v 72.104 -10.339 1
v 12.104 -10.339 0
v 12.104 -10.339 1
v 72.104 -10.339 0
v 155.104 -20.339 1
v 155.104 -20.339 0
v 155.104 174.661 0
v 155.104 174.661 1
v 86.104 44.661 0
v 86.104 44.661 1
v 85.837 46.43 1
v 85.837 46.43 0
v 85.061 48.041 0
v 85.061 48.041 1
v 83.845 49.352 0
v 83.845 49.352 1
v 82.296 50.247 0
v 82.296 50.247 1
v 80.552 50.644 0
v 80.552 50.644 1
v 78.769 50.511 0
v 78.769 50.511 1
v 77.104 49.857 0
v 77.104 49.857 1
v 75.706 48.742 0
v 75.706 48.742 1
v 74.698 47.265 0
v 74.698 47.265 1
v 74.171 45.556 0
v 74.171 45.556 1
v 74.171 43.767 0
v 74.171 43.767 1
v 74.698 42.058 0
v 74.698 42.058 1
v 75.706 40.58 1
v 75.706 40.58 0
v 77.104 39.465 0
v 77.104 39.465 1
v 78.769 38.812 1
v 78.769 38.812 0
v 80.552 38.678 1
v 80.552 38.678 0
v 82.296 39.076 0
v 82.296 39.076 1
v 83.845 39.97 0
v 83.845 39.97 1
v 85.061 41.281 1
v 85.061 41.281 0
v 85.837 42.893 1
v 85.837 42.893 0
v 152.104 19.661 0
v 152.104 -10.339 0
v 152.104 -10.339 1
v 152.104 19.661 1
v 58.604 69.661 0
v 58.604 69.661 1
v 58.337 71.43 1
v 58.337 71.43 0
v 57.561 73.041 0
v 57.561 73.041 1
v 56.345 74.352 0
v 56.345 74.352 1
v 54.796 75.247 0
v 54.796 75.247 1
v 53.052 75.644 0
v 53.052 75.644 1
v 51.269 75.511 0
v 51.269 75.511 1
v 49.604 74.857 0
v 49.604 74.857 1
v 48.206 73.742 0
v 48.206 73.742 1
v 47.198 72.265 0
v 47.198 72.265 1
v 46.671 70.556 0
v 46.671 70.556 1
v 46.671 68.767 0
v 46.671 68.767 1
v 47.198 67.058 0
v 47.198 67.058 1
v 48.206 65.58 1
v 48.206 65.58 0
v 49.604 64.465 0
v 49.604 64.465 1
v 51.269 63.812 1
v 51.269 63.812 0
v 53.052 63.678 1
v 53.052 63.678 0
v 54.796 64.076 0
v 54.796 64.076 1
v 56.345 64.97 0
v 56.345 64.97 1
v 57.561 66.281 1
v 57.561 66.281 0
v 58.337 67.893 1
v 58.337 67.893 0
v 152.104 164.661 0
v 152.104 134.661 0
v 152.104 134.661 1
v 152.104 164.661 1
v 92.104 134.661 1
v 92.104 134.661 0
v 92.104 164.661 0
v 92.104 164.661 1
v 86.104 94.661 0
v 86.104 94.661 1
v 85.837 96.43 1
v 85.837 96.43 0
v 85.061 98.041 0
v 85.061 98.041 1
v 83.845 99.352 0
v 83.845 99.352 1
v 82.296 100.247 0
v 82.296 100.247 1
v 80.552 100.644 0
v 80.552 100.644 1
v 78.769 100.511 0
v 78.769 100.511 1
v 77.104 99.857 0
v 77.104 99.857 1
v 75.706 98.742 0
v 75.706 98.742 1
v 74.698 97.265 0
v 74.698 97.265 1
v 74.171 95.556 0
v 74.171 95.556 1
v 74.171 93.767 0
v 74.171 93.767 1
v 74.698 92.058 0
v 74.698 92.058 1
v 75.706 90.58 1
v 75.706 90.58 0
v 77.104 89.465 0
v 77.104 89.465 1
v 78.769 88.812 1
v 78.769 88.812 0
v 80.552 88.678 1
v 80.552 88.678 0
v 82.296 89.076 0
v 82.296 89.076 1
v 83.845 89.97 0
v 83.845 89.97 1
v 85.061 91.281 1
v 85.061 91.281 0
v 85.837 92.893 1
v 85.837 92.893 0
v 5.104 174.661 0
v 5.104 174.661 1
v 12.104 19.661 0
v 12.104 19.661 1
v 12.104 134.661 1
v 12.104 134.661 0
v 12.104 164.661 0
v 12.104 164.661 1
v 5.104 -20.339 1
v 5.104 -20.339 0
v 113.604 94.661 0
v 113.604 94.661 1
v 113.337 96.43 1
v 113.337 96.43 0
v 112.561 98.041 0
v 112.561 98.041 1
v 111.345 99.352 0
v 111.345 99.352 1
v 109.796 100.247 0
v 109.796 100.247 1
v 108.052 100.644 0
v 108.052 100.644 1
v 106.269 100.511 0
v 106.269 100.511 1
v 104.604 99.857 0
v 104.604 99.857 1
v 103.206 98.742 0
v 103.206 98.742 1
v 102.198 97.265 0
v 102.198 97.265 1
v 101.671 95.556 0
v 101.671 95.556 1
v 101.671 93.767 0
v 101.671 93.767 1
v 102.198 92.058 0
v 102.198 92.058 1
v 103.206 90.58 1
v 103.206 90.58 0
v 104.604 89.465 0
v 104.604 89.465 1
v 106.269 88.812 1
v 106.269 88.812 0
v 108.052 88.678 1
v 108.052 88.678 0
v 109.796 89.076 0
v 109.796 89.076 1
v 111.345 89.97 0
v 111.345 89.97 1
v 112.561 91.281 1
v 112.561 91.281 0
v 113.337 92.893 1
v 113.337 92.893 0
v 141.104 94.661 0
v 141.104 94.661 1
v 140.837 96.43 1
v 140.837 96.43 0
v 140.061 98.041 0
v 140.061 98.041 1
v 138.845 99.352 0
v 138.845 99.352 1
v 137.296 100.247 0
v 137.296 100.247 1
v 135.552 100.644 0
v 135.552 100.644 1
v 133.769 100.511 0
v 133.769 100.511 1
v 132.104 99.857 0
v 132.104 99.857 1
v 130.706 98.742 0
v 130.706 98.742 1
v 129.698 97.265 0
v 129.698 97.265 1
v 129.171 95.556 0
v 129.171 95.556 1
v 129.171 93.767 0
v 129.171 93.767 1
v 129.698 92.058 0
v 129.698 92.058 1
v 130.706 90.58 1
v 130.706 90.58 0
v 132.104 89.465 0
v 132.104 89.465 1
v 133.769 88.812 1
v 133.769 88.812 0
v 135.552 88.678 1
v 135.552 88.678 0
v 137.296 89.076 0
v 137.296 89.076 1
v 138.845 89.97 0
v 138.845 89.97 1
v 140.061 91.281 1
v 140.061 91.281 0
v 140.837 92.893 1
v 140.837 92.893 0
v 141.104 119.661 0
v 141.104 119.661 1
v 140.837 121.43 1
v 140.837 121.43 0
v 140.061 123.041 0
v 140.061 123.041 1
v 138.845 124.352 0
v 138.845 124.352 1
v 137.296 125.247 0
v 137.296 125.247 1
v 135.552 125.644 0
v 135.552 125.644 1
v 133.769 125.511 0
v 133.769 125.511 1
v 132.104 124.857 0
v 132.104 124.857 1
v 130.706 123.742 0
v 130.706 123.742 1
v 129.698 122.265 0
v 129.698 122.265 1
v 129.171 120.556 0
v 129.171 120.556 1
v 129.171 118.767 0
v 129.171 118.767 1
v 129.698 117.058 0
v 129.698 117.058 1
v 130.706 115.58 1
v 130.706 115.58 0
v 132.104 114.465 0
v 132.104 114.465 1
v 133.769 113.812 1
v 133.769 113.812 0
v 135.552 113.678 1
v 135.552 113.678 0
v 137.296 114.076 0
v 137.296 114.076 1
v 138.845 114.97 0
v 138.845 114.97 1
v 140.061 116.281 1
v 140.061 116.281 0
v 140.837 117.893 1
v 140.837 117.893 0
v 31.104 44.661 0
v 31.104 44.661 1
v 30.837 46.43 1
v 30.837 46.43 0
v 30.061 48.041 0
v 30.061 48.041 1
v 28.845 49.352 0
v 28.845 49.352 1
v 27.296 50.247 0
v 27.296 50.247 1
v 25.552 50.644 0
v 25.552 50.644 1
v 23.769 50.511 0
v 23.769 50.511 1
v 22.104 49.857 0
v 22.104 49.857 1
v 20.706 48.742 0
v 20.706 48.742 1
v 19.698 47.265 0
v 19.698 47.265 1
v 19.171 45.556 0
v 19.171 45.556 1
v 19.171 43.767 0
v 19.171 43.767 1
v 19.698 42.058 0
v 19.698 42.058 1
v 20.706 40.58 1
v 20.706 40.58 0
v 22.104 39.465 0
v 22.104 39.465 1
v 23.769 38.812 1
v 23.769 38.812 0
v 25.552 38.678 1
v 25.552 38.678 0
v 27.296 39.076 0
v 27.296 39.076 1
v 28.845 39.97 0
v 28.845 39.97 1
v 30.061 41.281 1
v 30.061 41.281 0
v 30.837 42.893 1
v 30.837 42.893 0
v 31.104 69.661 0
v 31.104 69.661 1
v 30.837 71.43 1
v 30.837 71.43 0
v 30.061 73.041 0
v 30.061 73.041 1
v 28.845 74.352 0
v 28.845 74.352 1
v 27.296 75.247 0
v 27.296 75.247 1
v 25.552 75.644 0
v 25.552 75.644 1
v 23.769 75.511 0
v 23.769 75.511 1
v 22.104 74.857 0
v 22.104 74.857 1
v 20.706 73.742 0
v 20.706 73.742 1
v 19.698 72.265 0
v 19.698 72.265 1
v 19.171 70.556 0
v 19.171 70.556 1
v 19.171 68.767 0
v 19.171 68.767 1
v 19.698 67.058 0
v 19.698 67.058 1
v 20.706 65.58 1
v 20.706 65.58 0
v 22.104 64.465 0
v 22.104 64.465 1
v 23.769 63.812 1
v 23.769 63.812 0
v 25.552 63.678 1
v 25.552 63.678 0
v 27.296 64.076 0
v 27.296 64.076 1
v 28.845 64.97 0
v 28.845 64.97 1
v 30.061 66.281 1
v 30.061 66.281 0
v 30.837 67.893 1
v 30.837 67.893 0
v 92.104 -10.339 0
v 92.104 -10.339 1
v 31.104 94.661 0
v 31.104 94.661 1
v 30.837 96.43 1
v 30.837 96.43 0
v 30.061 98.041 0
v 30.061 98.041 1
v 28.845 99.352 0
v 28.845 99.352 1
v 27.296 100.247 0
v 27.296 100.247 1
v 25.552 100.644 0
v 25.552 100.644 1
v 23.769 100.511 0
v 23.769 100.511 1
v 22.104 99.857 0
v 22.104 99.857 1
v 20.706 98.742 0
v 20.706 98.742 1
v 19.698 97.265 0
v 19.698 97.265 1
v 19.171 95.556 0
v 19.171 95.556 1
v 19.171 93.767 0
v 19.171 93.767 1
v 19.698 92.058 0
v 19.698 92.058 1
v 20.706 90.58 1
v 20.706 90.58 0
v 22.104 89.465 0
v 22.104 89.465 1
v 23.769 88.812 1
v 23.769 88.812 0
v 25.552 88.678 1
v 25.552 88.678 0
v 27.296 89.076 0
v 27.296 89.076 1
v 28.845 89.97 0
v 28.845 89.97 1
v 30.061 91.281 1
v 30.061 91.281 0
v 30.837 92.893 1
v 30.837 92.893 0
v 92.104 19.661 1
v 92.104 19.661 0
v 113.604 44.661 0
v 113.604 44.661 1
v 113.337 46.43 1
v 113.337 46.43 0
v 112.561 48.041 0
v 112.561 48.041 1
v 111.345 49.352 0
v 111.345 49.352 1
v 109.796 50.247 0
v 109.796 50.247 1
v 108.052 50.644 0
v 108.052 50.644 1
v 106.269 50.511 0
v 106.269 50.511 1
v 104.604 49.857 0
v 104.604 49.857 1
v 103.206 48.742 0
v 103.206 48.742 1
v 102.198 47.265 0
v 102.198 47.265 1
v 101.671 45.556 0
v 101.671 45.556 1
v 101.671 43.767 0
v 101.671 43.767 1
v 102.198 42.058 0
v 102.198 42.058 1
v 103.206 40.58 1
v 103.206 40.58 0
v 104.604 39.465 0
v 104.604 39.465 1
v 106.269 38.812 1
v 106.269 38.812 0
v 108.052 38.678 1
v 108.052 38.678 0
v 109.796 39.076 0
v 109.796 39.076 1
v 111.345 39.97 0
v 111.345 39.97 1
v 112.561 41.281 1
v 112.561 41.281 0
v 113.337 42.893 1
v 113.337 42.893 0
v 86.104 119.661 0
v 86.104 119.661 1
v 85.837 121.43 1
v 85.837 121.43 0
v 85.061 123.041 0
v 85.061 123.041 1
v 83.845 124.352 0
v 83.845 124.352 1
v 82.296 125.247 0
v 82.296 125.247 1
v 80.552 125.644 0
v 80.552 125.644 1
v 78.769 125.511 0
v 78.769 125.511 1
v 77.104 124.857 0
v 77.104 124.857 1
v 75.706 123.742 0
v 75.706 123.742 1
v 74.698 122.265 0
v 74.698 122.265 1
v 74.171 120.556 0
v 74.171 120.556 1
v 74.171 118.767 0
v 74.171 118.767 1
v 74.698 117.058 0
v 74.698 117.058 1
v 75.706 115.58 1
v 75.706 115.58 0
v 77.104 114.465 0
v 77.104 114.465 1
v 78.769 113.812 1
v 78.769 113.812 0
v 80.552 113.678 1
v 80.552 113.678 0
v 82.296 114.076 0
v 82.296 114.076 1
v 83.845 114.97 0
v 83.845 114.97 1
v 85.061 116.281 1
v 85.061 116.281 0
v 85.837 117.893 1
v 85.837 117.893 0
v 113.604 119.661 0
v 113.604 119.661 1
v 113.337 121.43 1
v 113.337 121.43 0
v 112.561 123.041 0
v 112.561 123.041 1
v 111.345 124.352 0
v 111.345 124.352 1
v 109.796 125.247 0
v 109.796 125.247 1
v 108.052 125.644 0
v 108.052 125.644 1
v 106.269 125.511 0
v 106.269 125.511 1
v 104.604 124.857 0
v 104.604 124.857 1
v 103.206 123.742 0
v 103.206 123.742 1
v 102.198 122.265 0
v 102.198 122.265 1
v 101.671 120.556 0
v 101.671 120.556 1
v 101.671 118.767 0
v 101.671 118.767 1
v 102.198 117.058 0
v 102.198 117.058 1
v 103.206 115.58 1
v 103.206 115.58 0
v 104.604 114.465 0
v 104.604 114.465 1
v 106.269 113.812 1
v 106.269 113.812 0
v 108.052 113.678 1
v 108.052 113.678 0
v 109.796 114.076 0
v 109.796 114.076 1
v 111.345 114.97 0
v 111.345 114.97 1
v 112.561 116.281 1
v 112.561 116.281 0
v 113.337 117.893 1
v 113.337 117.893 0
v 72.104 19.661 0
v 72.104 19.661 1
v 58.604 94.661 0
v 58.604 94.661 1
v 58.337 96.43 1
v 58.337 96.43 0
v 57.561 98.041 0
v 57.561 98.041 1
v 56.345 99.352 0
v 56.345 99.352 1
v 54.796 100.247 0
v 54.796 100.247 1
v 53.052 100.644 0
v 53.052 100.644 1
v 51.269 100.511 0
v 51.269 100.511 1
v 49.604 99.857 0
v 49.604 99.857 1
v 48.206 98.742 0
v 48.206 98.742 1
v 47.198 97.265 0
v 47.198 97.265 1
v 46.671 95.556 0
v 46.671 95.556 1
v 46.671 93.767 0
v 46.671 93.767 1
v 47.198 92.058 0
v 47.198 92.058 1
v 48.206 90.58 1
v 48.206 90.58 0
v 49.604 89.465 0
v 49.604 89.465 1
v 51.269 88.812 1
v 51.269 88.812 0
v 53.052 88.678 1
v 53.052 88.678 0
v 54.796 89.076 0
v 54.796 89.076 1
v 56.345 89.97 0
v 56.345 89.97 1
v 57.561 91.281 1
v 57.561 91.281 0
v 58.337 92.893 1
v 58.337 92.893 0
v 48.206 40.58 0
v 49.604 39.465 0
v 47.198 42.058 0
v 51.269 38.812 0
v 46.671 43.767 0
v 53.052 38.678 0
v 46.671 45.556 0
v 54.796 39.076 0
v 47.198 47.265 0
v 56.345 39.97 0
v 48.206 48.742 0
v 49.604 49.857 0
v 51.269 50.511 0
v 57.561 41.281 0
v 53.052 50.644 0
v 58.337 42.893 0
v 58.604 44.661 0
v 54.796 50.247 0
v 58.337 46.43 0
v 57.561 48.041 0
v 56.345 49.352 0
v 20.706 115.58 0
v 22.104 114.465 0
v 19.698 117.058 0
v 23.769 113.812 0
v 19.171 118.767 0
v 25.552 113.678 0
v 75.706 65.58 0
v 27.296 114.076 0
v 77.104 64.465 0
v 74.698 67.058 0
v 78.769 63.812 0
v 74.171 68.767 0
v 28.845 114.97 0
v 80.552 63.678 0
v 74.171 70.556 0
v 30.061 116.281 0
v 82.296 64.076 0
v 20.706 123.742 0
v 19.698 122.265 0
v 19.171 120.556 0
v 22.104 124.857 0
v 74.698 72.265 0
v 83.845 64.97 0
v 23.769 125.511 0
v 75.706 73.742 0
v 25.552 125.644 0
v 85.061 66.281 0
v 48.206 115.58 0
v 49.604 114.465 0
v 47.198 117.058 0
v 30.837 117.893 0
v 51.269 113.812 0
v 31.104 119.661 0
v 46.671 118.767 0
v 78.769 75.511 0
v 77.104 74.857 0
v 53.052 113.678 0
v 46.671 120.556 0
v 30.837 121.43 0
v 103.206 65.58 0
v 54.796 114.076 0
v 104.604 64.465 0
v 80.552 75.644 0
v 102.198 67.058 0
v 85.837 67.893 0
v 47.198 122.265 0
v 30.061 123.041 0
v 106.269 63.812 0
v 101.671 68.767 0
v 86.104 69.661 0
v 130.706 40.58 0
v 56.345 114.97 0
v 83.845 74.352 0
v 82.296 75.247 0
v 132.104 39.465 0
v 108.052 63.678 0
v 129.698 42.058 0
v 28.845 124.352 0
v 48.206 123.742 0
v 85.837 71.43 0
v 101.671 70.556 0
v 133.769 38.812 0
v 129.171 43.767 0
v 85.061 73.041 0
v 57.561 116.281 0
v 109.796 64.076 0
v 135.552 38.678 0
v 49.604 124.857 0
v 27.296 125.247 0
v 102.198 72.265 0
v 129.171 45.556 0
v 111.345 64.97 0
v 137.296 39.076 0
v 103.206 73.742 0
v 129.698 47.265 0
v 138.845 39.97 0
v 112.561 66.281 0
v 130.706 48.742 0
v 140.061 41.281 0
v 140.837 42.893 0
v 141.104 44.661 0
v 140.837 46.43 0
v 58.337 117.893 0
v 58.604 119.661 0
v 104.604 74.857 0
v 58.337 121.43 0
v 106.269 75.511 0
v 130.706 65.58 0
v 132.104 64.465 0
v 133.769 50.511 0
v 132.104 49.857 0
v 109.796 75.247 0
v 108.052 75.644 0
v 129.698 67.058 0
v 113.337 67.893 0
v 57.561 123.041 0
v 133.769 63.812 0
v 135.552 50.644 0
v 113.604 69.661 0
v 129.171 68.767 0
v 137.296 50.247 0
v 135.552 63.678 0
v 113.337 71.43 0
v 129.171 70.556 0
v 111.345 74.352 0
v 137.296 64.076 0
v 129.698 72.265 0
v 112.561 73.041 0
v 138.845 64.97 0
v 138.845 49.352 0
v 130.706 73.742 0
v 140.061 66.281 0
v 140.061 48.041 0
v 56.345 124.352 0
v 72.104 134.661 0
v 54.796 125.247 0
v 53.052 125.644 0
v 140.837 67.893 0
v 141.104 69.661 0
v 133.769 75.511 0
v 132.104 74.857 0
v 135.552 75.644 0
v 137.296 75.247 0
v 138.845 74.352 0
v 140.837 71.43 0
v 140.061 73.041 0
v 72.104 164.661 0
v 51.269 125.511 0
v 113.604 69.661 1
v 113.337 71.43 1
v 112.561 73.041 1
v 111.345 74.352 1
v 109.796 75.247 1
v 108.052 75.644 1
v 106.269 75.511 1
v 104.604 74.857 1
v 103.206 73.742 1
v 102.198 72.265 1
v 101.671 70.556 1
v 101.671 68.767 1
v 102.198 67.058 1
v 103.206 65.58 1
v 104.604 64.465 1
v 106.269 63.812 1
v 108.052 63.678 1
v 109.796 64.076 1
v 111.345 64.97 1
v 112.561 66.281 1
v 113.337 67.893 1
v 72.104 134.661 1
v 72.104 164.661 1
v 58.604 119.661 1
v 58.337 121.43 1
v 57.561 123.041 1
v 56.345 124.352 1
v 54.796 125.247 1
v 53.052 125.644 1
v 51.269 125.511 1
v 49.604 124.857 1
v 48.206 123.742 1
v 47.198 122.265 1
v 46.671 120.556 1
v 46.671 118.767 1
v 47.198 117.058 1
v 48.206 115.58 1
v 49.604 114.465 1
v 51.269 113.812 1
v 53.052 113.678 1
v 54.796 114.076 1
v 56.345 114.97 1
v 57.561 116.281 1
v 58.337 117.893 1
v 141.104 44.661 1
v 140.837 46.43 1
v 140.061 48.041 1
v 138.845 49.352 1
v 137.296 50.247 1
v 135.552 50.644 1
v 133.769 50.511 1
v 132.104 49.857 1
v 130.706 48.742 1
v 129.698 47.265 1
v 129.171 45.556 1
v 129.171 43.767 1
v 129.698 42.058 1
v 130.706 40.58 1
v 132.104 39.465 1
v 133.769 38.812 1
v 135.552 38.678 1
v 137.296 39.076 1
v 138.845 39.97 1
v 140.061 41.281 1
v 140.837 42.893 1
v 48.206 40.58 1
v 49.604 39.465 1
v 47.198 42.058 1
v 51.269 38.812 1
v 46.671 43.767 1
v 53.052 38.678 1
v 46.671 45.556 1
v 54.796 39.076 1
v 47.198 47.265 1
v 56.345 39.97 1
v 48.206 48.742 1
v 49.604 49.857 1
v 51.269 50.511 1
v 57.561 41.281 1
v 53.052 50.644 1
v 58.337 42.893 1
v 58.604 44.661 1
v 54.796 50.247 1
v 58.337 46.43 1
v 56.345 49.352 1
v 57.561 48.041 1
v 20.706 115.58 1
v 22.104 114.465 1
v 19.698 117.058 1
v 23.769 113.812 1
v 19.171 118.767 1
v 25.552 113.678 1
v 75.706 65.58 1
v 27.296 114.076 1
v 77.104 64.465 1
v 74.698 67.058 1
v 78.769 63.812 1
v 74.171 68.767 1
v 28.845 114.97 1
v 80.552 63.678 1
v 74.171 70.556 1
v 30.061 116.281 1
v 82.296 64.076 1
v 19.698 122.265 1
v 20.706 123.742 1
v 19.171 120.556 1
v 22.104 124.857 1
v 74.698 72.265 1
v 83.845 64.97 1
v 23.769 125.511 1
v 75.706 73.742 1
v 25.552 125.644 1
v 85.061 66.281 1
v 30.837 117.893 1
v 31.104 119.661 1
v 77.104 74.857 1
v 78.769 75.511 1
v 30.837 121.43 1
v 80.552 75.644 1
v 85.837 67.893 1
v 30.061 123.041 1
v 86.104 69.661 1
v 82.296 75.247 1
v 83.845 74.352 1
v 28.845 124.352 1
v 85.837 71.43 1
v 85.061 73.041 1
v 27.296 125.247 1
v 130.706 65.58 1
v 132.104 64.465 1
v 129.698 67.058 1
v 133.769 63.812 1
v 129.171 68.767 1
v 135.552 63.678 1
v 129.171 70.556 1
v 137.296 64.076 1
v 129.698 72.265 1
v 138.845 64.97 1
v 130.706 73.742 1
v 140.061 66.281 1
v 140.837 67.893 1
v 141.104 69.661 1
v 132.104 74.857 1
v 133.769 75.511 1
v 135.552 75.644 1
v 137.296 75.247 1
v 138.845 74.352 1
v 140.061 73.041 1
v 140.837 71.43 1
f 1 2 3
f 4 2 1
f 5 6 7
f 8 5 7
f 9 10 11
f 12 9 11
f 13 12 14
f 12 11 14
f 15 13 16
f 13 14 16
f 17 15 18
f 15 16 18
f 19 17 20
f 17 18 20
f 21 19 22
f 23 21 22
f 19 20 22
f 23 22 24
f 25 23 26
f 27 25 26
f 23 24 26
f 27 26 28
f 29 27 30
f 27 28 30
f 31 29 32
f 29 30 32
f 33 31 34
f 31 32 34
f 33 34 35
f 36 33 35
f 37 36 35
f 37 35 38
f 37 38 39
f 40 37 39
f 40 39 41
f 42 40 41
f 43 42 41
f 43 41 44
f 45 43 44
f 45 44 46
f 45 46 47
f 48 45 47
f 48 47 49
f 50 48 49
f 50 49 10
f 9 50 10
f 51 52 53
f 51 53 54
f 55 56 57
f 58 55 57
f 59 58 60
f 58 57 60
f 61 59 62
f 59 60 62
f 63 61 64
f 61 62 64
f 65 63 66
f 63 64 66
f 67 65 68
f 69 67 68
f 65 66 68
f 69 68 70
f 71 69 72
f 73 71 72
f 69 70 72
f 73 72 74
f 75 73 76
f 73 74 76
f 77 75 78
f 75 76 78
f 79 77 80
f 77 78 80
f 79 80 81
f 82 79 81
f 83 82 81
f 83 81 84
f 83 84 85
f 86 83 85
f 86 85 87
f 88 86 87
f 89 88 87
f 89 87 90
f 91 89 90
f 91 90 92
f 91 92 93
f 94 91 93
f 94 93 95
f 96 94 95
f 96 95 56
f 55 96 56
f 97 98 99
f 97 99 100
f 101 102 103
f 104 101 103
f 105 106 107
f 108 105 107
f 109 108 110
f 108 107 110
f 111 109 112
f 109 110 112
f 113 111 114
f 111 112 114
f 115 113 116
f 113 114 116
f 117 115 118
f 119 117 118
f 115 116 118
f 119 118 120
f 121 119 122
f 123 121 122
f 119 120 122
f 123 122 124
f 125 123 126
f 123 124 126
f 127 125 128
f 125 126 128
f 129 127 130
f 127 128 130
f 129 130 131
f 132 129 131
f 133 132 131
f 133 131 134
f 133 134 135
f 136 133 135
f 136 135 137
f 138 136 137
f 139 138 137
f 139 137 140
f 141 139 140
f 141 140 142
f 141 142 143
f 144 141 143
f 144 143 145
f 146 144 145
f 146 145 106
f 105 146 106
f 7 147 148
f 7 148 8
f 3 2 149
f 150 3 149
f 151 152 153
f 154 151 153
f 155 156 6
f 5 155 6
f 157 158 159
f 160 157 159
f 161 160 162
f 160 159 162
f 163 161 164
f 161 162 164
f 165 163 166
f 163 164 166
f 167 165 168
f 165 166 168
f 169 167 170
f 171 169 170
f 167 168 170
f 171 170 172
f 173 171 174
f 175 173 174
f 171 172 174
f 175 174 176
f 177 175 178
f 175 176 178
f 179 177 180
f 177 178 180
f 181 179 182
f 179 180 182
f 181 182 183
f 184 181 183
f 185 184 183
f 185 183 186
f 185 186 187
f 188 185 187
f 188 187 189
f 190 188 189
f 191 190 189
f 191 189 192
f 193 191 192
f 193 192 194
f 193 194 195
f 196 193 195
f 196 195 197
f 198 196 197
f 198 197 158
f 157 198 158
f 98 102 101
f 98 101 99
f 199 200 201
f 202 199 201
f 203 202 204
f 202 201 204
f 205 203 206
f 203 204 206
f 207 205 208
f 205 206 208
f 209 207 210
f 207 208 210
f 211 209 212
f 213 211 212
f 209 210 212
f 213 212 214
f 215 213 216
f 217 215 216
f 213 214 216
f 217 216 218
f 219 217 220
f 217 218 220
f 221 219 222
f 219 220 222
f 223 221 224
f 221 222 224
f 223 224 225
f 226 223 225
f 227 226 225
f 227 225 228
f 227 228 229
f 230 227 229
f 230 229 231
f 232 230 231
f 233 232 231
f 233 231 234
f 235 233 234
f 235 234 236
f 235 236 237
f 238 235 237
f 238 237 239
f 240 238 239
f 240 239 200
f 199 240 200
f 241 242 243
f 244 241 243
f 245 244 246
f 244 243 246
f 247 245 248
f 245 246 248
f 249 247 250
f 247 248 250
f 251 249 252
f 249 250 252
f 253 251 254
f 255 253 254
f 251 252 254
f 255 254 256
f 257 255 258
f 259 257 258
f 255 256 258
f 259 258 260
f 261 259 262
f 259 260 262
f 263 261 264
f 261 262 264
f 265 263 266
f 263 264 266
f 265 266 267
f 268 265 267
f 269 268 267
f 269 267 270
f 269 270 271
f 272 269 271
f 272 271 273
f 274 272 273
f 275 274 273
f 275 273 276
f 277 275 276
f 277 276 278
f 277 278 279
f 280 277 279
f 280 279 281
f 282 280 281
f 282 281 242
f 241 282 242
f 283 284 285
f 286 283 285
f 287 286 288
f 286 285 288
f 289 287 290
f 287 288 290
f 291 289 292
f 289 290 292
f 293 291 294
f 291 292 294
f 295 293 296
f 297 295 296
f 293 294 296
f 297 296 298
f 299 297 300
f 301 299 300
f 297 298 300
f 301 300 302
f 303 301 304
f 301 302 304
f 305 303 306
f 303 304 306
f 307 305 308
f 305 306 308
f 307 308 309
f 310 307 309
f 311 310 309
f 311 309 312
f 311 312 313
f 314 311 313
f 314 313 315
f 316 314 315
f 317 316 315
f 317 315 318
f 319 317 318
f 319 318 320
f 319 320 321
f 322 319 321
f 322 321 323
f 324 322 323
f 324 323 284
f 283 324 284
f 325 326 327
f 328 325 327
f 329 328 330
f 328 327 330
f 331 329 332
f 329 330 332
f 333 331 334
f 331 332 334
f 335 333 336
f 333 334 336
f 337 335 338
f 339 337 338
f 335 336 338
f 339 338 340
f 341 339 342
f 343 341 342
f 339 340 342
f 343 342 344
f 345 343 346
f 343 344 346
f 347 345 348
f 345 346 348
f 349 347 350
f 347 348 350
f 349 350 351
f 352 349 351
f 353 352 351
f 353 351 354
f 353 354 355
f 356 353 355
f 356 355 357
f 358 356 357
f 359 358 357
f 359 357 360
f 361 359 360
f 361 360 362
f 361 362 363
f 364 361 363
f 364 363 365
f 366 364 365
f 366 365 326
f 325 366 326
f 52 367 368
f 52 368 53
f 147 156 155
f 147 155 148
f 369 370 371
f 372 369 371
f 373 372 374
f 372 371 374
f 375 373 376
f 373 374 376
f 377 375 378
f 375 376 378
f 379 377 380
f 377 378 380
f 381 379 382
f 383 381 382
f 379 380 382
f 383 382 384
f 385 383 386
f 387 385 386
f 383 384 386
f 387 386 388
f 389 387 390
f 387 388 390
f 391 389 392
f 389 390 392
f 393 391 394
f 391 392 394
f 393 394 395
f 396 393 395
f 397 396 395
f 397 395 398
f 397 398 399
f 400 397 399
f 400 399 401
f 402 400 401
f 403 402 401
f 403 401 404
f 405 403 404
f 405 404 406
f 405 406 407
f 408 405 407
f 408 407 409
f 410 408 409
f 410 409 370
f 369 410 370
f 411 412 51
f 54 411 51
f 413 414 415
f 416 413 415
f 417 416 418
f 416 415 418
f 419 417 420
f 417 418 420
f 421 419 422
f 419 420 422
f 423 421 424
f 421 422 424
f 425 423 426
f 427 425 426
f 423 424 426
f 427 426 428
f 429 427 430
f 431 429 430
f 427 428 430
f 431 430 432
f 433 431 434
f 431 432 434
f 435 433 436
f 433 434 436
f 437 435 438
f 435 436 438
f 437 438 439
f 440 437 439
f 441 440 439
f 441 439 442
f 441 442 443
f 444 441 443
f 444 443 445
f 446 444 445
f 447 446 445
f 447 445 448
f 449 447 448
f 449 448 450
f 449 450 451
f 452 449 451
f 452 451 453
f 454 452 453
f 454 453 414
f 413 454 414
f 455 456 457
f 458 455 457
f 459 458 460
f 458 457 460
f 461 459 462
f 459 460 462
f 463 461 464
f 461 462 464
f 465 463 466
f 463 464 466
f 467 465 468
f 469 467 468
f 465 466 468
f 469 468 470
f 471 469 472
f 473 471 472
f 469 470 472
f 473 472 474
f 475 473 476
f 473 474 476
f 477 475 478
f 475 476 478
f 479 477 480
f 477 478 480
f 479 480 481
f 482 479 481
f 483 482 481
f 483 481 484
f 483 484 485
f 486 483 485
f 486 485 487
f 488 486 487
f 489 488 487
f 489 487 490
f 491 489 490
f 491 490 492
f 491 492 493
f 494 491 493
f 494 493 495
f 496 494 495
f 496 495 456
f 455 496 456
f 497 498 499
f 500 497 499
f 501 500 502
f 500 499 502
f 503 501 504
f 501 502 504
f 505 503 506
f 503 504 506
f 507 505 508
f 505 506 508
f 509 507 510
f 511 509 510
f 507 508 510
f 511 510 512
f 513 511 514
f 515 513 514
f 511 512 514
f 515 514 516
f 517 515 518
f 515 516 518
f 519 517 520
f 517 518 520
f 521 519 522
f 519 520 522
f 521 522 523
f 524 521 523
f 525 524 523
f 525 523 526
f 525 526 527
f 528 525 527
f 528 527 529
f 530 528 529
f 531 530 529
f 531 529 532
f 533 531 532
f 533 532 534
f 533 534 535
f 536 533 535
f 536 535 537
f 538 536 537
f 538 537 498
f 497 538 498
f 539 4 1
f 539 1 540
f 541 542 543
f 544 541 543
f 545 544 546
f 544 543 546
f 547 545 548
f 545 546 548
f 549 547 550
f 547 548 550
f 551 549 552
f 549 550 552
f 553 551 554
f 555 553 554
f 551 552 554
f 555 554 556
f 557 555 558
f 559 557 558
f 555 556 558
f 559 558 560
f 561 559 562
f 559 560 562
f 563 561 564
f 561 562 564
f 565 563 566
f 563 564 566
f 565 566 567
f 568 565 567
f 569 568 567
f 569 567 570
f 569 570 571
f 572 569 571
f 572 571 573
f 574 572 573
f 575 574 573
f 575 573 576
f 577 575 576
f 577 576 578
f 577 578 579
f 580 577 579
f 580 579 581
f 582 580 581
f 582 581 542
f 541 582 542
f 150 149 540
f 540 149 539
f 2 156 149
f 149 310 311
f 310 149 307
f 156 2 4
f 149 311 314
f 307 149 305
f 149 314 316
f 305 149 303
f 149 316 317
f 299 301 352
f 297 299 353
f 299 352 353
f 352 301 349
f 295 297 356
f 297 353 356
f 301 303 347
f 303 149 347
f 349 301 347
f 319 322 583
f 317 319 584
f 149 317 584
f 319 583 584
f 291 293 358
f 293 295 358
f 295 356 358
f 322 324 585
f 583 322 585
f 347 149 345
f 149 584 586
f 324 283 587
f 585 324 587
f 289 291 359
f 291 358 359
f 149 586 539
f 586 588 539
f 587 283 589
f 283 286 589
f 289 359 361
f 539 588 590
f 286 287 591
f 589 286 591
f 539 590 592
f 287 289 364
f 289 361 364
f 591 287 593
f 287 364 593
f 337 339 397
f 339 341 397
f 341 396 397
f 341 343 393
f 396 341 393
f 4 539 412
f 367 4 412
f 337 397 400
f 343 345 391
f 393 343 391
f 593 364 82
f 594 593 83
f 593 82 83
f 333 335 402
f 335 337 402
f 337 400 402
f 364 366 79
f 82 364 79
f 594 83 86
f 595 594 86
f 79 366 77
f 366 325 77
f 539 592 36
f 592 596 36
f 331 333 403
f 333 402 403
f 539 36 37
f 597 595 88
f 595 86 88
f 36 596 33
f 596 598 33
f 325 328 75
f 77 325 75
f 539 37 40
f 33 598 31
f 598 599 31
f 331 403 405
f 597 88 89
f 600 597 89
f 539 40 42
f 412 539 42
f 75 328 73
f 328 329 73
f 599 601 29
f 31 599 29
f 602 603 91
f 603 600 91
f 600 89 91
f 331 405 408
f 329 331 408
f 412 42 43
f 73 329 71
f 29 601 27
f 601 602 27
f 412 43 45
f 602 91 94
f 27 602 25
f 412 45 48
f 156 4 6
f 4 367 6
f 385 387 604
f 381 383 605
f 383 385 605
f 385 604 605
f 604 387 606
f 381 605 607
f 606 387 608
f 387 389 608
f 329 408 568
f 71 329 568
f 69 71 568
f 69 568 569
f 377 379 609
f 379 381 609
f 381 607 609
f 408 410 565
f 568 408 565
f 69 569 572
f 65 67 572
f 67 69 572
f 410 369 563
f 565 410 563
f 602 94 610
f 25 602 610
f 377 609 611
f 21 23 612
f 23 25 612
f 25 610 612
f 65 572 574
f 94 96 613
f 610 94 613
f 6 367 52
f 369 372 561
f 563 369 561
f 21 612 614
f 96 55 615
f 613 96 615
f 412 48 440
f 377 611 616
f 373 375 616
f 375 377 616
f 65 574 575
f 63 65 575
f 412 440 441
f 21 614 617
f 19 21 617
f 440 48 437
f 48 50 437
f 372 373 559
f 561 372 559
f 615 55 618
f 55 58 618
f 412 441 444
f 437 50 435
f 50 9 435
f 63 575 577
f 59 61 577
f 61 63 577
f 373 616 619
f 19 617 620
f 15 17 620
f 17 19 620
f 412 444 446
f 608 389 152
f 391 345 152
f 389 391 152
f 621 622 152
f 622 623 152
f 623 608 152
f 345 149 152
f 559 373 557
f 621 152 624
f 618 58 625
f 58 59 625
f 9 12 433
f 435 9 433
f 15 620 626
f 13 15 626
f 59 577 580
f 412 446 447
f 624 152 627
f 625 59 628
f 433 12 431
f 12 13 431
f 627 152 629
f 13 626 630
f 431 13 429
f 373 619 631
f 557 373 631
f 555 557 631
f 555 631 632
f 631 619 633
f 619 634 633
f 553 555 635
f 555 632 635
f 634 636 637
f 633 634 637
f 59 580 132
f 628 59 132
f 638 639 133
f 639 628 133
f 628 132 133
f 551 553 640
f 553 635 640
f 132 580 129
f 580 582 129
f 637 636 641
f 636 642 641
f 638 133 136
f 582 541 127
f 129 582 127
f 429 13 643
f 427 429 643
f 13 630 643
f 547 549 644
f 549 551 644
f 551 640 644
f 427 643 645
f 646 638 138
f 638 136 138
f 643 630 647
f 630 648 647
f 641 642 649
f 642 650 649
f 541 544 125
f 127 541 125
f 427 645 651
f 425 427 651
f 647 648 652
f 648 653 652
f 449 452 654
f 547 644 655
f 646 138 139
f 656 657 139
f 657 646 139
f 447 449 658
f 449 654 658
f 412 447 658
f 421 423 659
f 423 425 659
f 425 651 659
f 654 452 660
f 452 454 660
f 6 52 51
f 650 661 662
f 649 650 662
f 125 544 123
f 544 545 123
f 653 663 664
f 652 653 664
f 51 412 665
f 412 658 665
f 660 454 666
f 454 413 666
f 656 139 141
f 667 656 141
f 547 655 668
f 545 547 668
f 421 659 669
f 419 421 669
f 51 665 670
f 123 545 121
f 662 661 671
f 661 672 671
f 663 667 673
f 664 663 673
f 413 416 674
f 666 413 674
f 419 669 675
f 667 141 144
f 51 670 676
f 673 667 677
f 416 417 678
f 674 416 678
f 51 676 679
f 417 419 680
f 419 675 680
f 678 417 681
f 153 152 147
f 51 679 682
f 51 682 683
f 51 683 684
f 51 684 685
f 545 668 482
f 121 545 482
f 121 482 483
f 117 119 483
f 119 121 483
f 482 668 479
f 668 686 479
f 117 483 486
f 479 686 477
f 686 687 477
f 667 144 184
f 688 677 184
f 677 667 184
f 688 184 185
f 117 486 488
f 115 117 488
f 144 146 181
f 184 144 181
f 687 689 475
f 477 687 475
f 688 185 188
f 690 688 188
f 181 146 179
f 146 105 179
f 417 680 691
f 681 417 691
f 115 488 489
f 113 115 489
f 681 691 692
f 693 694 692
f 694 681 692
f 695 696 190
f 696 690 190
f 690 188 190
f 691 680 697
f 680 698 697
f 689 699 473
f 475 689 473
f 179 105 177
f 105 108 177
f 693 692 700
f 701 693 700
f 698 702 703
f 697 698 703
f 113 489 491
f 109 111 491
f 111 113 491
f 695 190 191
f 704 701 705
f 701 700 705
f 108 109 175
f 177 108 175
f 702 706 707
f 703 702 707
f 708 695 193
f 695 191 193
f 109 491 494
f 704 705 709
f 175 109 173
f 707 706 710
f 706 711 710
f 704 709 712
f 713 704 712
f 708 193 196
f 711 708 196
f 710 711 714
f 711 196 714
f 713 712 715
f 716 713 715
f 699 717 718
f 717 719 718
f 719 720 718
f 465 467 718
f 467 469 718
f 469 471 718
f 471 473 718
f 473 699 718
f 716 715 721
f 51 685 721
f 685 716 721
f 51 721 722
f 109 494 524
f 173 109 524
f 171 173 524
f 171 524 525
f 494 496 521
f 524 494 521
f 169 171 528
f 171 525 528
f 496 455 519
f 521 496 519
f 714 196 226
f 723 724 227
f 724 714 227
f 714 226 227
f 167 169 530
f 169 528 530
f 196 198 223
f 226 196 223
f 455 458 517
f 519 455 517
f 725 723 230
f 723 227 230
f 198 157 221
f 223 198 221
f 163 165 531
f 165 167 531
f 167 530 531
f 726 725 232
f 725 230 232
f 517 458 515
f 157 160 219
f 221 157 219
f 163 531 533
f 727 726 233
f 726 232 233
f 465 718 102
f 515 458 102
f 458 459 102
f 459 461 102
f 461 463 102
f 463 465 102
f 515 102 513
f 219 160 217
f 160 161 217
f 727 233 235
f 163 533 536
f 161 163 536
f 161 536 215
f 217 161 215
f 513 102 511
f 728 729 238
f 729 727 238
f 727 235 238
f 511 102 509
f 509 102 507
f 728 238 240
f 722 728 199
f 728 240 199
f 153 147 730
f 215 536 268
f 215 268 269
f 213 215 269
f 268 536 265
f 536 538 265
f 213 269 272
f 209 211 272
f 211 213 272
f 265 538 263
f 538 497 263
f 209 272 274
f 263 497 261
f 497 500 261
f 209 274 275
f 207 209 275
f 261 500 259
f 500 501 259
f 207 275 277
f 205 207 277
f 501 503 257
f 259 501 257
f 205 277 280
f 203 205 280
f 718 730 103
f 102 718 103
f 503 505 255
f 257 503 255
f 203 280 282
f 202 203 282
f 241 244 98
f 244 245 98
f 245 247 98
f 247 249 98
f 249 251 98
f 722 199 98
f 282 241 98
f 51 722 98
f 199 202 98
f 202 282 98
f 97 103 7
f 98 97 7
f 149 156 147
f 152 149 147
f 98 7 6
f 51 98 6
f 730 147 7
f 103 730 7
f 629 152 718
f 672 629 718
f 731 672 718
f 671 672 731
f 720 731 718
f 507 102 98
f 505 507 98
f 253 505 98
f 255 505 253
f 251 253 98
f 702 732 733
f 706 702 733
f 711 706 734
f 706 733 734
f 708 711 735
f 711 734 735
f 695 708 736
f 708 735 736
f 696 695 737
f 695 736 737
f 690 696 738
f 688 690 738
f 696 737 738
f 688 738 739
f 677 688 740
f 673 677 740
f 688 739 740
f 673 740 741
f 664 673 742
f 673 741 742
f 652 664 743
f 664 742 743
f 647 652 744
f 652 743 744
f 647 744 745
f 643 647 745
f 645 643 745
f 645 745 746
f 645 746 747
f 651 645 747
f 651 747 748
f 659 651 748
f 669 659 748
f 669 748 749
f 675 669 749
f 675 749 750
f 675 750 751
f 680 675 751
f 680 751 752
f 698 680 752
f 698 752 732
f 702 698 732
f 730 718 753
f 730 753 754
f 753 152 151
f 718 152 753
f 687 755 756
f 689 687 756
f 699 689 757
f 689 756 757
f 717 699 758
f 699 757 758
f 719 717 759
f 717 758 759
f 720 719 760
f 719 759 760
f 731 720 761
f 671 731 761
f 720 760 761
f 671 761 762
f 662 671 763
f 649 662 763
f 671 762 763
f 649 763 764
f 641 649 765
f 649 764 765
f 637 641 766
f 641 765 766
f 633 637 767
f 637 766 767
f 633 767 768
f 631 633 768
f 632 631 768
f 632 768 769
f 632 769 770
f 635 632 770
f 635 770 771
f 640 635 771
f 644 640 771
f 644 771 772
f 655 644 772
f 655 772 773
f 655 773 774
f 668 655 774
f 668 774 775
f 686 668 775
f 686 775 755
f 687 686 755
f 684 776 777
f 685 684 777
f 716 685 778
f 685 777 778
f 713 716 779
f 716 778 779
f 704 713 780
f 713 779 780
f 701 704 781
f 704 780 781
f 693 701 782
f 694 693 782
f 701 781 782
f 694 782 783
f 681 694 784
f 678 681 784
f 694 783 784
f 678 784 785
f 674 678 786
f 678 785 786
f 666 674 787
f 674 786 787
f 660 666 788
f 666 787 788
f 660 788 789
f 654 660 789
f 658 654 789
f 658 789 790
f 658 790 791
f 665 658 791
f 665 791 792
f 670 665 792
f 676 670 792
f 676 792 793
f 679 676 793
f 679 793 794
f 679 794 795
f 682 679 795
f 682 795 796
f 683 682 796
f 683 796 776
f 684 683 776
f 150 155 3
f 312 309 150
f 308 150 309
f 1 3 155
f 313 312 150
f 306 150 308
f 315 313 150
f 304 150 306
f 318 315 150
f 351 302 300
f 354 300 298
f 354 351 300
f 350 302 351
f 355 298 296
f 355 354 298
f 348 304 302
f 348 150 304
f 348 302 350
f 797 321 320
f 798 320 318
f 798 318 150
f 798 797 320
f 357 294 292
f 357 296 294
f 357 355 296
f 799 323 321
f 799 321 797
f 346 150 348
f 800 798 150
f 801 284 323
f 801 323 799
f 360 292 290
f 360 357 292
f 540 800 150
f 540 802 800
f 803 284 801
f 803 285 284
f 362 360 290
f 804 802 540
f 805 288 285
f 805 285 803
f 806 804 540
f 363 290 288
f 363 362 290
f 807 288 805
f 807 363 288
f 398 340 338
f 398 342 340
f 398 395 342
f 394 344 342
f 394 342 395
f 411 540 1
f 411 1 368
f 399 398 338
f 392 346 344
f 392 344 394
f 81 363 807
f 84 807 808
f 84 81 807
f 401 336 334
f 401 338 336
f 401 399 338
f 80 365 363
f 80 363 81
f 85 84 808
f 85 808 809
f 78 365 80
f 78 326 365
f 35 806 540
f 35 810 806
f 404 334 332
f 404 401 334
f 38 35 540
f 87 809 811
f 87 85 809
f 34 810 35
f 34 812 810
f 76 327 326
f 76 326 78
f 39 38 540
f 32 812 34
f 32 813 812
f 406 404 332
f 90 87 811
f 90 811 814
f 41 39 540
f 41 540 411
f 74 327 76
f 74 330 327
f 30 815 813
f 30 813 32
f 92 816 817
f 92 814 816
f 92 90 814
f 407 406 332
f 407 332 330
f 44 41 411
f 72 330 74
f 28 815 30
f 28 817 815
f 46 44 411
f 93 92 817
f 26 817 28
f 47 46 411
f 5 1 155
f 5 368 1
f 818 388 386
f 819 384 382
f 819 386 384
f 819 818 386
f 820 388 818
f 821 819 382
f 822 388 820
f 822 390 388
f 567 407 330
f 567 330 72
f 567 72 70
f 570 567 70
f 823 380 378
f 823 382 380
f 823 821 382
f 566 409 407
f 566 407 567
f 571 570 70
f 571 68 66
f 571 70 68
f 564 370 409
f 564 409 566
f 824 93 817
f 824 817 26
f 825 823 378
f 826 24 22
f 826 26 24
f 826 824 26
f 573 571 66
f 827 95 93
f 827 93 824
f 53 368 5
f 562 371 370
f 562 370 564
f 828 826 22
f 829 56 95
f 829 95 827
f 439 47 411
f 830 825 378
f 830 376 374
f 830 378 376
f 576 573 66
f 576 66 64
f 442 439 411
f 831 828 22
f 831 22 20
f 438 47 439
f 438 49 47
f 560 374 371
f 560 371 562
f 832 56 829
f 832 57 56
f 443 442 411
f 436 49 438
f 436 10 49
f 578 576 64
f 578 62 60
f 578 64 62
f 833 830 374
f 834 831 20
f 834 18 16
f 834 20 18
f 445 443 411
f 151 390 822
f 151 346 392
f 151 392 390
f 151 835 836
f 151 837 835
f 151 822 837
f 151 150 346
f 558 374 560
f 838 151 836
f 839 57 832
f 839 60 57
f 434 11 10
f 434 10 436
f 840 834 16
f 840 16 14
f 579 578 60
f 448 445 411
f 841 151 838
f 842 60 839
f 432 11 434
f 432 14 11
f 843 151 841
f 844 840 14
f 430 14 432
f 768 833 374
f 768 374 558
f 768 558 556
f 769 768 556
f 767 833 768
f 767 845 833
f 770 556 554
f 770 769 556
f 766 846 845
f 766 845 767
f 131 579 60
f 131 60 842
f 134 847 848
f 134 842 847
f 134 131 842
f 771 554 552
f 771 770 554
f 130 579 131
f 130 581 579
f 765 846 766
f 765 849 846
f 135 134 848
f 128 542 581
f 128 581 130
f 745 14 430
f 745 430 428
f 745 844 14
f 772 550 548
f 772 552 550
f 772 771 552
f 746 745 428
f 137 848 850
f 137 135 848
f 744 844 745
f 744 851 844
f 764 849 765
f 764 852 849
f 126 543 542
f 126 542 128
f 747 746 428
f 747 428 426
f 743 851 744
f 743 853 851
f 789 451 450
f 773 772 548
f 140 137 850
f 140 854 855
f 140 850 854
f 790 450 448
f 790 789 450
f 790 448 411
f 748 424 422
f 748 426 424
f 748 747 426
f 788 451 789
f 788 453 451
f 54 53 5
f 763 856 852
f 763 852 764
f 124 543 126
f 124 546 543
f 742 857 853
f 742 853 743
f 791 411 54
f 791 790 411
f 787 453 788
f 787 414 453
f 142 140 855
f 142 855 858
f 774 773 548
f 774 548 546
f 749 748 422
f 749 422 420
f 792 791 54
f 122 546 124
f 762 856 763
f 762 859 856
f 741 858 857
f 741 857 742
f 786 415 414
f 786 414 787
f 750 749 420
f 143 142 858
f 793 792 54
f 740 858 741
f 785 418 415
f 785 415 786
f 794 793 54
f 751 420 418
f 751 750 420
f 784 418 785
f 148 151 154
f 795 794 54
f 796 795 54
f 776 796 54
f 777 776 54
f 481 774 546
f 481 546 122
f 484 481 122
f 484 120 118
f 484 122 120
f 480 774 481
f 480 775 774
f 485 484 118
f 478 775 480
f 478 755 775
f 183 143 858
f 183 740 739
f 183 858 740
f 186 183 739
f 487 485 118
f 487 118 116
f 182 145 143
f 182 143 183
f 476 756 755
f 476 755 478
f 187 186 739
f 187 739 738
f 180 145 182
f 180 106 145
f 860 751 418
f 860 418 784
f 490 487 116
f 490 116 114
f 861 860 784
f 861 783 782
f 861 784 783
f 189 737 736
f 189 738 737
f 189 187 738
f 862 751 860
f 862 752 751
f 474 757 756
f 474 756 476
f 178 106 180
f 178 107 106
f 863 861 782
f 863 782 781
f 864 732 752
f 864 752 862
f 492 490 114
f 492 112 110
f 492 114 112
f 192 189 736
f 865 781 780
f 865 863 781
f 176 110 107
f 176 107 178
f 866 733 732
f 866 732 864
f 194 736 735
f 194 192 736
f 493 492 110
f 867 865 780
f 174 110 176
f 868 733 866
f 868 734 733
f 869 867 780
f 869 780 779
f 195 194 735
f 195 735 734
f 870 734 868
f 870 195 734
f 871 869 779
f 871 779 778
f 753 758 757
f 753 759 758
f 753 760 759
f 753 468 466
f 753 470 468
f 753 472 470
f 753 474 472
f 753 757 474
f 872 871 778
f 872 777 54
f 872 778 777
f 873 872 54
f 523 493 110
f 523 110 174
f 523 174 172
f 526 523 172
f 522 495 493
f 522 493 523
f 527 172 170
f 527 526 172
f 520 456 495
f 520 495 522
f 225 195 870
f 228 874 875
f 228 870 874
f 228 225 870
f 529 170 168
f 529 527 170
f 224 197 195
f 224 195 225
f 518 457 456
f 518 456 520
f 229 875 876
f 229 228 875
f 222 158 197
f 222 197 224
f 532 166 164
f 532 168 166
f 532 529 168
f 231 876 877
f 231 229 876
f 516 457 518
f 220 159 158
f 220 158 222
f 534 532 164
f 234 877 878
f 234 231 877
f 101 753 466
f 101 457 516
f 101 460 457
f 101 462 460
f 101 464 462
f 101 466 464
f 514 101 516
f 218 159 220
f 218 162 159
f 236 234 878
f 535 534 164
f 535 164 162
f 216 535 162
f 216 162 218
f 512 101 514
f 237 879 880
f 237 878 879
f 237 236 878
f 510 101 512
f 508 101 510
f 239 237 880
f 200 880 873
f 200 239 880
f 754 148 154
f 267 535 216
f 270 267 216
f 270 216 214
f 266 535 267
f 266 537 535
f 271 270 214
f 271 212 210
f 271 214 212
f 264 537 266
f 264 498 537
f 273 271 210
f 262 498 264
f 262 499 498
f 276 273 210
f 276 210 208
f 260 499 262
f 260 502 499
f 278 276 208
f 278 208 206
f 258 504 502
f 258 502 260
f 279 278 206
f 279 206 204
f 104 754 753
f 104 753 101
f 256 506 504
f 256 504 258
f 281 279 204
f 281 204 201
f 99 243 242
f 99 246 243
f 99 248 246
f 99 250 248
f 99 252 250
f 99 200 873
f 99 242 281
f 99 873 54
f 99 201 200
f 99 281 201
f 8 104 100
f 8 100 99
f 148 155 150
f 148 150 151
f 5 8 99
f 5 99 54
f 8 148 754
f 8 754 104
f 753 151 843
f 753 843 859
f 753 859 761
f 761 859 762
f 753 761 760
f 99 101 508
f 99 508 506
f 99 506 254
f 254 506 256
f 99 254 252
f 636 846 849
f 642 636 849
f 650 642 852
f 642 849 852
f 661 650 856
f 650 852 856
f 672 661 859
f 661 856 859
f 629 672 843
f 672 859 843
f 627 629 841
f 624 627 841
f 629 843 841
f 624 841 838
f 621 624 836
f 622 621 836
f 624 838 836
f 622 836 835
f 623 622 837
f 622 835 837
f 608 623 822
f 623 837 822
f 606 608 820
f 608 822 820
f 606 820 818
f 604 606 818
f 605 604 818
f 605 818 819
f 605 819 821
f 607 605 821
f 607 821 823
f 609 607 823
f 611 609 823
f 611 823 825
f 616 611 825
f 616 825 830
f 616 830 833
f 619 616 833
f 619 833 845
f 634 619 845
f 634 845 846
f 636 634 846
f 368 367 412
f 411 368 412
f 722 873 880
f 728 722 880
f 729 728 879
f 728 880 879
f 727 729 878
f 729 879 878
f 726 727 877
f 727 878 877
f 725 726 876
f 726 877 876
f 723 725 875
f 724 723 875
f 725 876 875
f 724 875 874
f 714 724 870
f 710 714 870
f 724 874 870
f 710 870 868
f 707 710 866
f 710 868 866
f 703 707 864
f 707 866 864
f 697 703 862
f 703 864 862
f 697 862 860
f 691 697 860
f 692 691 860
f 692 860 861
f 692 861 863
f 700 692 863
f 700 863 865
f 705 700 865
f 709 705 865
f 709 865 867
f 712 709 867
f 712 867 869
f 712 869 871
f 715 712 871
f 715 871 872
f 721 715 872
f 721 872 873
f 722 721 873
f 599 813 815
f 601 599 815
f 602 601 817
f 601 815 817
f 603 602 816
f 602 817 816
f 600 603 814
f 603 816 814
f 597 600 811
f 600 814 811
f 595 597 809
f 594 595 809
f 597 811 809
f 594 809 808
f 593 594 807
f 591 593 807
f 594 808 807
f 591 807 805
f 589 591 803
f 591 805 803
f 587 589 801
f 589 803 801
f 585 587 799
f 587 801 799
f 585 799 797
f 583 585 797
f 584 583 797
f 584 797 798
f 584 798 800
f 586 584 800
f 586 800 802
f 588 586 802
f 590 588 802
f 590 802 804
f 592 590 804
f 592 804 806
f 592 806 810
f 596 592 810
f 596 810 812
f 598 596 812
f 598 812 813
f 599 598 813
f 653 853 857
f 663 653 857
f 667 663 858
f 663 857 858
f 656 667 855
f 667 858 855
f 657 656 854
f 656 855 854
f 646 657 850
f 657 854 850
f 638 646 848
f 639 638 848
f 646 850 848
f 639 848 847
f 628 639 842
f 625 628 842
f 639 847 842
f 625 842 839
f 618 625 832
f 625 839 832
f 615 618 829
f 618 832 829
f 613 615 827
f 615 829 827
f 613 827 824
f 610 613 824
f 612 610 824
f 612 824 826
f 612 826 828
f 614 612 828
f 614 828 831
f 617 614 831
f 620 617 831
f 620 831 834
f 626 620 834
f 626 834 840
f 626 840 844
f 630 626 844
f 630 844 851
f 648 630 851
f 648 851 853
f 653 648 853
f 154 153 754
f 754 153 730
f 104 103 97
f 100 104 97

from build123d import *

# Parameters (mm, degrees)
SKETCH1_W           = 150
SKETCH1_H           = 195
SKETCH1_W_2         = 60
SKETCH1_H_2         = 30
BOSS_EXTRUDE1_DEPTH = 1
SKETCH2_R           = 6
CUT_EXTRUDE1_DEPTH  = 2


with BuildPart() as part:
    # Sketch1 → Boss-Extrude1 (new body)
    with BuildSketch(Plane.XY):
        with Locations((80.10402455, 77.161264357)):
            Rectangle(SKETCH1_W, SKETCH1_H)
        with Locations((42.10402455, 149.661264357)):
            Rectangle(SKETCH1_W_2, SKETCH1_H_2, mode=Mode.SUBTRACT)
        with Locations((122.10402455, 149.661264357)):
            Rectangle(SKETCH1_W_2, SKETCH1_H_2, mode=Mode.SUBTRACT)
        with Locations((42.10402455, 4.661264357)):
            Rectangle(SKETCH1_W_2, SKETCH1_H_2, mode=Mode.SUBTRACT)
        with Locations((122.10402455, 4.661264357)):
            Rectangle(SKETCH1_W_2, SKETCH1_H_2, mode=Mode.SUBTRACT)
    extrude(amount=BOSS_EXTRUDE1_DEPTH)

    # Sketch2 → Cut-Extrude1 (cut)
    with BuildSketch(Plane.XY.offset(1)):
        with Locations((25.10402455, 119.661264357)):
            Circle(SKETCH2_R)
        with Locations((25.10402455, 94.661264357)):
            Circle(SKETCH2_R)
        with Locations((25.10402455, 69.661264357)):
            Circle(SKETCH2_R)
        with Locations((25.10402455, 44.661264357)):
            Circle(SKETCH2_R)
        with Locations((52.60402455, 119.661264357)):
            Circle(SKETCH2_R)
        with Locations((52.60402455, 69.661264357)):
            Circle(SKETCH2_R)
        with Locations((52.60402455, 94.661264357)):
            Circle(SKETCH2_R)
        with Locations((52.60402455, 44.661264357)):
            Circle(SKETCH2_R)
        with Locations((80.10402455, 119.661264357)):
            Circle(SKETCH2_R)
        with Locations((80.10402455, 69.661264357)):
            Circle(SKETCH2_R)
        with Locations((80.10402455, 94.661264357)):
            Circle(SKETCH2_R)
        with Locations((80.10402455, 44.661264357)):
            Circle(SKETCH2_R)
        with Locations((107.60402455, 119.661264357)):
            Circle(SKETCH2_R)
        with Locations((107.60402455, 69.661264357)):
            Circle(SKETCH2_R)
        with Locations((107.60402455, 94.661264357)):
            Circle(SKETCH2_R)
        with Locations((107.60402455, 44.661264357)):
            Circle(SKETCH2_R)
        with Locations((135.10402455, 119.661264357)):
            Circle(SKETCH2_R)
        with Locations((135.10402455, 69.661264357)):
            Circle(SKETCH2_R)
        with Locations((135.10402455, 94.661264357)):
            Circle(SKETCH2_R)
        with Locations((135.10402455, 44.661264357)):
            Circle(SKETCH2_R)
    extrude(amount=-CUT_EXTRUDE1_DEPTH, mode=Mode.SUBTRACT)


solid = part.part
